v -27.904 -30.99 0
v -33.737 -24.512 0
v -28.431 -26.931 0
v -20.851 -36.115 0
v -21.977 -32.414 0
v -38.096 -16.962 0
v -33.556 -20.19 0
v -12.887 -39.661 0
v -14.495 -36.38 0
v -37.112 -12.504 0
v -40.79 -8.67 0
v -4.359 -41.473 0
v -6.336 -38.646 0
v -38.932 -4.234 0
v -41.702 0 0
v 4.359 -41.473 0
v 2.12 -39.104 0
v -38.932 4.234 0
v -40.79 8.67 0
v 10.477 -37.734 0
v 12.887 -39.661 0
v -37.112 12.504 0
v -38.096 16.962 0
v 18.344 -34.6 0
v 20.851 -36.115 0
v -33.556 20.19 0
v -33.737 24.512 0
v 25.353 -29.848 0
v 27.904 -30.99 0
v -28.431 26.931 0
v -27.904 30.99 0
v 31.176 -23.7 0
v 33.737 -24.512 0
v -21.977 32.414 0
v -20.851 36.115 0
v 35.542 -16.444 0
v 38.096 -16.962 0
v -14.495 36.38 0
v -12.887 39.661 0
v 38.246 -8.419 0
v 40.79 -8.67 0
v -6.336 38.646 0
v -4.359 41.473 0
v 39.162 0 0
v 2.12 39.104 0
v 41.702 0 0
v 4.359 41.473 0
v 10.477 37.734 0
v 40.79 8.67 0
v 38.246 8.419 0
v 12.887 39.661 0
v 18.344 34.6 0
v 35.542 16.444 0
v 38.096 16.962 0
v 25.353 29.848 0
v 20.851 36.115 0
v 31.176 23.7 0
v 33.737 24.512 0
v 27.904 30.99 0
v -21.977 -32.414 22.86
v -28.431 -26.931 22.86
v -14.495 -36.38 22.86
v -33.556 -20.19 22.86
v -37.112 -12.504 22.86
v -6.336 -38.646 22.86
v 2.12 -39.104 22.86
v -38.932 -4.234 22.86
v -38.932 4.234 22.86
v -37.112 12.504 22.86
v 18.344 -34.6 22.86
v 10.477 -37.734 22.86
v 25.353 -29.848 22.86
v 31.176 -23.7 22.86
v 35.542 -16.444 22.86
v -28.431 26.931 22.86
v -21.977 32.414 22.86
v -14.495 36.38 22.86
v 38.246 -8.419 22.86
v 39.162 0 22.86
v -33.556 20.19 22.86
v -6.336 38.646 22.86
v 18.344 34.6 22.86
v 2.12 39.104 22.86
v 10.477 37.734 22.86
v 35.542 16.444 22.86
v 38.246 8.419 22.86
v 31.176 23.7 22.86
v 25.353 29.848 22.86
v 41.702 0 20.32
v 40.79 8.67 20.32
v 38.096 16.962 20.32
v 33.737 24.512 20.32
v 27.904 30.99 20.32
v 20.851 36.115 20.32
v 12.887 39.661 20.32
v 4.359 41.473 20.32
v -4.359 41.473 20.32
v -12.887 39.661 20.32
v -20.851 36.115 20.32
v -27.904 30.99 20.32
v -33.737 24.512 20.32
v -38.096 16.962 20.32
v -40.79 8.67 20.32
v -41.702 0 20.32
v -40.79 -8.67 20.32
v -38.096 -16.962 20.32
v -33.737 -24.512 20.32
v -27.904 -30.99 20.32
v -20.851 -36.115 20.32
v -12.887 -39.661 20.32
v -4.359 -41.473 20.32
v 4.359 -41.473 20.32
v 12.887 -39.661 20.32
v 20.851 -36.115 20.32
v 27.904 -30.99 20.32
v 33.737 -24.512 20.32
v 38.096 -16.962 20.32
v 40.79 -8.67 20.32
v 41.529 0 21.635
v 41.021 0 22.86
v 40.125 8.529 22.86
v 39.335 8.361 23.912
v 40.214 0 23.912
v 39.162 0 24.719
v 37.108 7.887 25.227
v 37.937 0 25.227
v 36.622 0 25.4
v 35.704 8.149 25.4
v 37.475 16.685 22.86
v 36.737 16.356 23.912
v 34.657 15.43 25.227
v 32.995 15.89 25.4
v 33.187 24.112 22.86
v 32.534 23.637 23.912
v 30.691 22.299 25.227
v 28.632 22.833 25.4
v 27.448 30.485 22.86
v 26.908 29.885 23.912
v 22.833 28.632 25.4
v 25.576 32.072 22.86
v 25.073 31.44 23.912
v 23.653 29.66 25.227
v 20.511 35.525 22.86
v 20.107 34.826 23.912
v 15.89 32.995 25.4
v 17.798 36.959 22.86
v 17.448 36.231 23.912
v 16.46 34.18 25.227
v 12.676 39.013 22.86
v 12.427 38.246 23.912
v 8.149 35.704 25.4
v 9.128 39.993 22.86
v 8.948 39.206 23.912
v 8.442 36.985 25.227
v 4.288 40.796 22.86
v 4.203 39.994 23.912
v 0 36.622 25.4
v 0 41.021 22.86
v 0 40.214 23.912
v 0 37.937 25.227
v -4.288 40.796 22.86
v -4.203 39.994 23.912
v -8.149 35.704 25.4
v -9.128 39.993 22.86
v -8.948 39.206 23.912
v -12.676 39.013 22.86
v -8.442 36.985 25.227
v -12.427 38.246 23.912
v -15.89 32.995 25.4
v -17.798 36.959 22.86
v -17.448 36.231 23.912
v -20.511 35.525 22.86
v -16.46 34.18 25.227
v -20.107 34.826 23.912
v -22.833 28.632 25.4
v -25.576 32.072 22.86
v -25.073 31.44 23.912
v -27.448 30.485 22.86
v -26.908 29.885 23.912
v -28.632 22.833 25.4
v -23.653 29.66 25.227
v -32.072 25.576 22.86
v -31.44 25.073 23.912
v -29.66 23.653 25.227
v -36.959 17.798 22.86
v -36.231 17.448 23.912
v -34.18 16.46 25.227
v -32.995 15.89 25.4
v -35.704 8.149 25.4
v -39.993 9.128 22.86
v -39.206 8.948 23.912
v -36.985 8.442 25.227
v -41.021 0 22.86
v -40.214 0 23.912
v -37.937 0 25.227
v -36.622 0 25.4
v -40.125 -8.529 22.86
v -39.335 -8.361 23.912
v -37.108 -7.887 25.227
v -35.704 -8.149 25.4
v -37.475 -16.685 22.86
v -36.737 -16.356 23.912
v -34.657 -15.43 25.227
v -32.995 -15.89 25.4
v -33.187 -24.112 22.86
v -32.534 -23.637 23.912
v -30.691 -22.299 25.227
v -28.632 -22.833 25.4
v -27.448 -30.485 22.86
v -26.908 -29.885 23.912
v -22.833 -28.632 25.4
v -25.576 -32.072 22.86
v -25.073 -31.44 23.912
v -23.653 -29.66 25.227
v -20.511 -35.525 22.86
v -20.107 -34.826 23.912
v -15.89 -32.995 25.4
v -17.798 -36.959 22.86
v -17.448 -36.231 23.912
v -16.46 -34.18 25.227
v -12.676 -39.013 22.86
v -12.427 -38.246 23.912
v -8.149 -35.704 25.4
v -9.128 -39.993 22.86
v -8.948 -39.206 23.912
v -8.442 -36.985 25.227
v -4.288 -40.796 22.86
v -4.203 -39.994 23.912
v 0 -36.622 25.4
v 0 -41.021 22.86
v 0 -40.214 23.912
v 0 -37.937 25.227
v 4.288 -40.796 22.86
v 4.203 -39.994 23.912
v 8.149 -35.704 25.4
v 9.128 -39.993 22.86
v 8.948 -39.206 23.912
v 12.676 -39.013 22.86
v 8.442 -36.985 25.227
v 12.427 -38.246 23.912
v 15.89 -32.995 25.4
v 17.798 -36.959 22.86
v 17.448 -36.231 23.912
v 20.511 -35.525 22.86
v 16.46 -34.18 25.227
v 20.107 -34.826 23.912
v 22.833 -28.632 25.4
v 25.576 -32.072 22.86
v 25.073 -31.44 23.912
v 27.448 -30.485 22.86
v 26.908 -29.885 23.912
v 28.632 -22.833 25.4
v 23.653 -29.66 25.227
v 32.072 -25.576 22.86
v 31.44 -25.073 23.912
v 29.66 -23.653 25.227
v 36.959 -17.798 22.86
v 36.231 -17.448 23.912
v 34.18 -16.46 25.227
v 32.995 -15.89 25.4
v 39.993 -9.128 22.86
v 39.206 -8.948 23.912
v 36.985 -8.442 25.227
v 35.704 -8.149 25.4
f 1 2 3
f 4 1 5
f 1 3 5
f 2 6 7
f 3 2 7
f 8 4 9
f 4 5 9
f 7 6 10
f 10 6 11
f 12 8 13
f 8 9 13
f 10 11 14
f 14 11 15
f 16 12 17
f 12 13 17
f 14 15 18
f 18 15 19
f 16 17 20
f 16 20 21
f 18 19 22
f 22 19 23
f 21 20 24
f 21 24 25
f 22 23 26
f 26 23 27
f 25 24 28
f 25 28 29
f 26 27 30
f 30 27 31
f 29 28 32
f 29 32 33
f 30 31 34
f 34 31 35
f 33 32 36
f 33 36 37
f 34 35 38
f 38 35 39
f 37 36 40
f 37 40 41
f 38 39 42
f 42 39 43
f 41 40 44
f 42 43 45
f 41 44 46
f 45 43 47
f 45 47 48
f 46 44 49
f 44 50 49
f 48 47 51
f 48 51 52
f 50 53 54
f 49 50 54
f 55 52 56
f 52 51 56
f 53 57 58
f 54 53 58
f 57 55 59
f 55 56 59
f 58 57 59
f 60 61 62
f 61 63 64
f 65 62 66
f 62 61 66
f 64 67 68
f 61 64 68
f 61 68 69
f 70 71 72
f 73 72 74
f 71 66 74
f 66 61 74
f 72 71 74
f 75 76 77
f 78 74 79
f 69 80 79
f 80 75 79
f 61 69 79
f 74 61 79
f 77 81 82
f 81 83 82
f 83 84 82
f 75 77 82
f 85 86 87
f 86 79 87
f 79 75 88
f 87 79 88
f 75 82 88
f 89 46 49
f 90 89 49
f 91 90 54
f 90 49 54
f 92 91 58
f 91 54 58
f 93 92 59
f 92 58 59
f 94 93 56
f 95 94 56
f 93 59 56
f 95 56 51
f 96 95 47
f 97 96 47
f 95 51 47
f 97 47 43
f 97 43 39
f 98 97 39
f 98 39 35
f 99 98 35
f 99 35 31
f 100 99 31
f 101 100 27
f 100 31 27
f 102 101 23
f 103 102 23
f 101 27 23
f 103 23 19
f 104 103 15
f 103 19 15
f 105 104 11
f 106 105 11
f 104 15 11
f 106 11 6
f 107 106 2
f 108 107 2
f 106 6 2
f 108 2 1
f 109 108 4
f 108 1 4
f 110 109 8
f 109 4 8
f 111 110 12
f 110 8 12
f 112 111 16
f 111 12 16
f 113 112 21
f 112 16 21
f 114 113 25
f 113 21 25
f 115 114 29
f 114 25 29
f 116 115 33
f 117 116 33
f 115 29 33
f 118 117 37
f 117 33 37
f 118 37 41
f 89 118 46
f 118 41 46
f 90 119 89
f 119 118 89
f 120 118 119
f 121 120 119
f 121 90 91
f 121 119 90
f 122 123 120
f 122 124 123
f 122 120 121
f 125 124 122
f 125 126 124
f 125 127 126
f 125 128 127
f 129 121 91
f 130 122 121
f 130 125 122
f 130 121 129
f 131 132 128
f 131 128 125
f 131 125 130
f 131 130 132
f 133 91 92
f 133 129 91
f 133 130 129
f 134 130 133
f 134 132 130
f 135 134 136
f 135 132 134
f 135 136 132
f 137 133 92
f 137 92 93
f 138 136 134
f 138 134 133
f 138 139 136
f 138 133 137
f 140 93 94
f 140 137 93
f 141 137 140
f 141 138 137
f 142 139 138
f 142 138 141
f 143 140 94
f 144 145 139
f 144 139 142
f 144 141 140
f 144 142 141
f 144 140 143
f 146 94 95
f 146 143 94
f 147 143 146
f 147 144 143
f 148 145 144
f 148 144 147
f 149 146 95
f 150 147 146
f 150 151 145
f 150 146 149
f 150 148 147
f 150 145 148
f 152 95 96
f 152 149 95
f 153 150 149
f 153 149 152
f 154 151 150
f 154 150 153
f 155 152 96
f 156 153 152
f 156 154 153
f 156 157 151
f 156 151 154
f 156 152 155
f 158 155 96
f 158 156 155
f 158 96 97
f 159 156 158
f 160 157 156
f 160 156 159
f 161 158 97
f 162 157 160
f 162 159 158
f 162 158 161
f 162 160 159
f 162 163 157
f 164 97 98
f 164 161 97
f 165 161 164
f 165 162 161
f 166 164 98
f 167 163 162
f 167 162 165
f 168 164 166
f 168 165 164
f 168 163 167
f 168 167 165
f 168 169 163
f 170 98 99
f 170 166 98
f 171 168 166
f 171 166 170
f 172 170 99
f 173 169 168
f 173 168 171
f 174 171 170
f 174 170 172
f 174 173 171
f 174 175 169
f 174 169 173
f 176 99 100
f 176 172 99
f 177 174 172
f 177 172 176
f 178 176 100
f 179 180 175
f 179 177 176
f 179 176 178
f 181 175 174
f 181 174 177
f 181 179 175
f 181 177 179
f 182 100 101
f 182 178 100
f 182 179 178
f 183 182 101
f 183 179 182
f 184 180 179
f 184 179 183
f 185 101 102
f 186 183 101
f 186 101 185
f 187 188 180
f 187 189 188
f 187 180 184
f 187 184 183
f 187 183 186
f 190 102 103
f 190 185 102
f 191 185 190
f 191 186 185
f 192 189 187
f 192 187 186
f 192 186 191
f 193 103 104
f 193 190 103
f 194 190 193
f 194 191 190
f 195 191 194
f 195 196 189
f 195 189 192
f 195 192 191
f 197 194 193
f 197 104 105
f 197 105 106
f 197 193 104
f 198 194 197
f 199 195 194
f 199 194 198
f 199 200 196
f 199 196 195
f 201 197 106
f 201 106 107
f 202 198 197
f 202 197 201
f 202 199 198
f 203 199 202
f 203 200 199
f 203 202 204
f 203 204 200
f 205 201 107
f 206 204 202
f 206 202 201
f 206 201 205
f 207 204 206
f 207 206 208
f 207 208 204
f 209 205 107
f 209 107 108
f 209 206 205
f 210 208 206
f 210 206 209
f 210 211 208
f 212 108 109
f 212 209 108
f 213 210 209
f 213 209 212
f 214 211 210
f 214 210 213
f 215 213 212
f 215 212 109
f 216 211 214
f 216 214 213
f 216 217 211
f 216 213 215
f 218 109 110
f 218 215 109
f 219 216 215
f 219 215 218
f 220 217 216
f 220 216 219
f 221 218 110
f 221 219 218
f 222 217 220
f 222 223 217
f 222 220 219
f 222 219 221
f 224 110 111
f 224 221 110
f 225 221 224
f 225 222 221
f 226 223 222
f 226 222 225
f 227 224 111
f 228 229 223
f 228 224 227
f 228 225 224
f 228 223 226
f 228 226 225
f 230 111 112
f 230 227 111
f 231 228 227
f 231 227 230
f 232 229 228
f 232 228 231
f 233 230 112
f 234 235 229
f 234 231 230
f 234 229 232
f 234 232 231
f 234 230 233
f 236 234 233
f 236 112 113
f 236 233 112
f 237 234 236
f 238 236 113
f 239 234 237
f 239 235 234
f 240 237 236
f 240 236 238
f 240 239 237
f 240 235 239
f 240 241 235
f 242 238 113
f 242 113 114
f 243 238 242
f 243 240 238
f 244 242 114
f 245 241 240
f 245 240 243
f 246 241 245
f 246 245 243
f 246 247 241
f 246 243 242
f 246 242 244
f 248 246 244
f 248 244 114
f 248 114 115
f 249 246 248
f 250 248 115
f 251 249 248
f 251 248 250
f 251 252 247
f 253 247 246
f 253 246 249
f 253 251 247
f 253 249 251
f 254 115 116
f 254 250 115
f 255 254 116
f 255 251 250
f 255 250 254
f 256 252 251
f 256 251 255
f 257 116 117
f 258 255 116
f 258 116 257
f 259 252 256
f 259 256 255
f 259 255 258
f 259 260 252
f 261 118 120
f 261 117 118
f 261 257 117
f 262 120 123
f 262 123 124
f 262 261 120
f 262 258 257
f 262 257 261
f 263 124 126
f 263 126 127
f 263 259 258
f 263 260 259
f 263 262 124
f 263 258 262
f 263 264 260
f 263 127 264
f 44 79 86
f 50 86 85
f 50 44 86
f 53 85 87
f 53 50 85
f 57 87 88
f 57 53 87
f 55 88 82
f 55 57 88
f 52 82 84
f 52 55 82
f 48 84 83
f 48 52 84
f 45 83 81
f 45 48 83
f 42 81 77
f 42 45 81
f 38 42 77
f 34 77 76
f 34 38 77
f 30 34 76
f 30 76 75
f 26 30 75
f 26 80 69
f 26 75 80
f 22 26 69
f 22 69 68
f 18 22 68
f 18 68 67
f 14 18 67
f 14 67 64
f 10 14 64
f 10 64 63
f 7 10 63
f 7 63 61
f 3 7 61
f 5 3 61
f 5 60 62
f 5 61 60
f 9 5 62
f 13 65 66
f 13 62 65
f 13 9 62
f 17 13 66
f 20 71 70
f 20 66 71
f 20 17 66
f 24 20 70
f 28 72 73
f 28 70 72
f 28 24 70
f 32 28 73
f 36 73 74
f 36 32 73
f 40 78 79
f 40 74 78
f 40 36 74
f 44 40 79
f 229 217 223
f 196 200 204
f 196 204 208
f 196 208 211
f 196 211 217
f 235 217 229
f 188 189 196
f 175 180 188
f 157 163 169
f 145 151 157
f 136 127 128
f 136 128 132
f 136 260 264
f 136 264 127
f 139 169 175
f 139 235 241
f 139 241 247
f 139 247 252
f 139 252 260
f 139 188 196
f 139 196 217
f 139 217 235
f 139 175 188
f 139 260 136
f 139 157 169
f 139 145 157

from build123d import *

# Parameters (mm, degrees)
F0_R     = 41.701709
F1_DEPTH = 25.4
F2_T     = -2.54
F3_R     = 5.08


with BuildPart() as f1:
    # F0 (on Top) → F1 (new body)
    with BuildSketch(Plane.XY):
        Circle(F0_R)
    extrude(amount=F1_DEPTH)

    # F2
    f2_openings = [f1.faces().sort_by_distance(p)[0] for p in [
        (0, 0, 0),
    ]]
    offset(amount=F2_T, openings=f2_openings)

    # F3
    f3_edges = [f1.edges().sort_by_distance(p)[0] for p in [
        (-41.701709, 0, 25.4),
    ]]
    fillet(f3_edges, radius=F3_R)


solid = f1.part
